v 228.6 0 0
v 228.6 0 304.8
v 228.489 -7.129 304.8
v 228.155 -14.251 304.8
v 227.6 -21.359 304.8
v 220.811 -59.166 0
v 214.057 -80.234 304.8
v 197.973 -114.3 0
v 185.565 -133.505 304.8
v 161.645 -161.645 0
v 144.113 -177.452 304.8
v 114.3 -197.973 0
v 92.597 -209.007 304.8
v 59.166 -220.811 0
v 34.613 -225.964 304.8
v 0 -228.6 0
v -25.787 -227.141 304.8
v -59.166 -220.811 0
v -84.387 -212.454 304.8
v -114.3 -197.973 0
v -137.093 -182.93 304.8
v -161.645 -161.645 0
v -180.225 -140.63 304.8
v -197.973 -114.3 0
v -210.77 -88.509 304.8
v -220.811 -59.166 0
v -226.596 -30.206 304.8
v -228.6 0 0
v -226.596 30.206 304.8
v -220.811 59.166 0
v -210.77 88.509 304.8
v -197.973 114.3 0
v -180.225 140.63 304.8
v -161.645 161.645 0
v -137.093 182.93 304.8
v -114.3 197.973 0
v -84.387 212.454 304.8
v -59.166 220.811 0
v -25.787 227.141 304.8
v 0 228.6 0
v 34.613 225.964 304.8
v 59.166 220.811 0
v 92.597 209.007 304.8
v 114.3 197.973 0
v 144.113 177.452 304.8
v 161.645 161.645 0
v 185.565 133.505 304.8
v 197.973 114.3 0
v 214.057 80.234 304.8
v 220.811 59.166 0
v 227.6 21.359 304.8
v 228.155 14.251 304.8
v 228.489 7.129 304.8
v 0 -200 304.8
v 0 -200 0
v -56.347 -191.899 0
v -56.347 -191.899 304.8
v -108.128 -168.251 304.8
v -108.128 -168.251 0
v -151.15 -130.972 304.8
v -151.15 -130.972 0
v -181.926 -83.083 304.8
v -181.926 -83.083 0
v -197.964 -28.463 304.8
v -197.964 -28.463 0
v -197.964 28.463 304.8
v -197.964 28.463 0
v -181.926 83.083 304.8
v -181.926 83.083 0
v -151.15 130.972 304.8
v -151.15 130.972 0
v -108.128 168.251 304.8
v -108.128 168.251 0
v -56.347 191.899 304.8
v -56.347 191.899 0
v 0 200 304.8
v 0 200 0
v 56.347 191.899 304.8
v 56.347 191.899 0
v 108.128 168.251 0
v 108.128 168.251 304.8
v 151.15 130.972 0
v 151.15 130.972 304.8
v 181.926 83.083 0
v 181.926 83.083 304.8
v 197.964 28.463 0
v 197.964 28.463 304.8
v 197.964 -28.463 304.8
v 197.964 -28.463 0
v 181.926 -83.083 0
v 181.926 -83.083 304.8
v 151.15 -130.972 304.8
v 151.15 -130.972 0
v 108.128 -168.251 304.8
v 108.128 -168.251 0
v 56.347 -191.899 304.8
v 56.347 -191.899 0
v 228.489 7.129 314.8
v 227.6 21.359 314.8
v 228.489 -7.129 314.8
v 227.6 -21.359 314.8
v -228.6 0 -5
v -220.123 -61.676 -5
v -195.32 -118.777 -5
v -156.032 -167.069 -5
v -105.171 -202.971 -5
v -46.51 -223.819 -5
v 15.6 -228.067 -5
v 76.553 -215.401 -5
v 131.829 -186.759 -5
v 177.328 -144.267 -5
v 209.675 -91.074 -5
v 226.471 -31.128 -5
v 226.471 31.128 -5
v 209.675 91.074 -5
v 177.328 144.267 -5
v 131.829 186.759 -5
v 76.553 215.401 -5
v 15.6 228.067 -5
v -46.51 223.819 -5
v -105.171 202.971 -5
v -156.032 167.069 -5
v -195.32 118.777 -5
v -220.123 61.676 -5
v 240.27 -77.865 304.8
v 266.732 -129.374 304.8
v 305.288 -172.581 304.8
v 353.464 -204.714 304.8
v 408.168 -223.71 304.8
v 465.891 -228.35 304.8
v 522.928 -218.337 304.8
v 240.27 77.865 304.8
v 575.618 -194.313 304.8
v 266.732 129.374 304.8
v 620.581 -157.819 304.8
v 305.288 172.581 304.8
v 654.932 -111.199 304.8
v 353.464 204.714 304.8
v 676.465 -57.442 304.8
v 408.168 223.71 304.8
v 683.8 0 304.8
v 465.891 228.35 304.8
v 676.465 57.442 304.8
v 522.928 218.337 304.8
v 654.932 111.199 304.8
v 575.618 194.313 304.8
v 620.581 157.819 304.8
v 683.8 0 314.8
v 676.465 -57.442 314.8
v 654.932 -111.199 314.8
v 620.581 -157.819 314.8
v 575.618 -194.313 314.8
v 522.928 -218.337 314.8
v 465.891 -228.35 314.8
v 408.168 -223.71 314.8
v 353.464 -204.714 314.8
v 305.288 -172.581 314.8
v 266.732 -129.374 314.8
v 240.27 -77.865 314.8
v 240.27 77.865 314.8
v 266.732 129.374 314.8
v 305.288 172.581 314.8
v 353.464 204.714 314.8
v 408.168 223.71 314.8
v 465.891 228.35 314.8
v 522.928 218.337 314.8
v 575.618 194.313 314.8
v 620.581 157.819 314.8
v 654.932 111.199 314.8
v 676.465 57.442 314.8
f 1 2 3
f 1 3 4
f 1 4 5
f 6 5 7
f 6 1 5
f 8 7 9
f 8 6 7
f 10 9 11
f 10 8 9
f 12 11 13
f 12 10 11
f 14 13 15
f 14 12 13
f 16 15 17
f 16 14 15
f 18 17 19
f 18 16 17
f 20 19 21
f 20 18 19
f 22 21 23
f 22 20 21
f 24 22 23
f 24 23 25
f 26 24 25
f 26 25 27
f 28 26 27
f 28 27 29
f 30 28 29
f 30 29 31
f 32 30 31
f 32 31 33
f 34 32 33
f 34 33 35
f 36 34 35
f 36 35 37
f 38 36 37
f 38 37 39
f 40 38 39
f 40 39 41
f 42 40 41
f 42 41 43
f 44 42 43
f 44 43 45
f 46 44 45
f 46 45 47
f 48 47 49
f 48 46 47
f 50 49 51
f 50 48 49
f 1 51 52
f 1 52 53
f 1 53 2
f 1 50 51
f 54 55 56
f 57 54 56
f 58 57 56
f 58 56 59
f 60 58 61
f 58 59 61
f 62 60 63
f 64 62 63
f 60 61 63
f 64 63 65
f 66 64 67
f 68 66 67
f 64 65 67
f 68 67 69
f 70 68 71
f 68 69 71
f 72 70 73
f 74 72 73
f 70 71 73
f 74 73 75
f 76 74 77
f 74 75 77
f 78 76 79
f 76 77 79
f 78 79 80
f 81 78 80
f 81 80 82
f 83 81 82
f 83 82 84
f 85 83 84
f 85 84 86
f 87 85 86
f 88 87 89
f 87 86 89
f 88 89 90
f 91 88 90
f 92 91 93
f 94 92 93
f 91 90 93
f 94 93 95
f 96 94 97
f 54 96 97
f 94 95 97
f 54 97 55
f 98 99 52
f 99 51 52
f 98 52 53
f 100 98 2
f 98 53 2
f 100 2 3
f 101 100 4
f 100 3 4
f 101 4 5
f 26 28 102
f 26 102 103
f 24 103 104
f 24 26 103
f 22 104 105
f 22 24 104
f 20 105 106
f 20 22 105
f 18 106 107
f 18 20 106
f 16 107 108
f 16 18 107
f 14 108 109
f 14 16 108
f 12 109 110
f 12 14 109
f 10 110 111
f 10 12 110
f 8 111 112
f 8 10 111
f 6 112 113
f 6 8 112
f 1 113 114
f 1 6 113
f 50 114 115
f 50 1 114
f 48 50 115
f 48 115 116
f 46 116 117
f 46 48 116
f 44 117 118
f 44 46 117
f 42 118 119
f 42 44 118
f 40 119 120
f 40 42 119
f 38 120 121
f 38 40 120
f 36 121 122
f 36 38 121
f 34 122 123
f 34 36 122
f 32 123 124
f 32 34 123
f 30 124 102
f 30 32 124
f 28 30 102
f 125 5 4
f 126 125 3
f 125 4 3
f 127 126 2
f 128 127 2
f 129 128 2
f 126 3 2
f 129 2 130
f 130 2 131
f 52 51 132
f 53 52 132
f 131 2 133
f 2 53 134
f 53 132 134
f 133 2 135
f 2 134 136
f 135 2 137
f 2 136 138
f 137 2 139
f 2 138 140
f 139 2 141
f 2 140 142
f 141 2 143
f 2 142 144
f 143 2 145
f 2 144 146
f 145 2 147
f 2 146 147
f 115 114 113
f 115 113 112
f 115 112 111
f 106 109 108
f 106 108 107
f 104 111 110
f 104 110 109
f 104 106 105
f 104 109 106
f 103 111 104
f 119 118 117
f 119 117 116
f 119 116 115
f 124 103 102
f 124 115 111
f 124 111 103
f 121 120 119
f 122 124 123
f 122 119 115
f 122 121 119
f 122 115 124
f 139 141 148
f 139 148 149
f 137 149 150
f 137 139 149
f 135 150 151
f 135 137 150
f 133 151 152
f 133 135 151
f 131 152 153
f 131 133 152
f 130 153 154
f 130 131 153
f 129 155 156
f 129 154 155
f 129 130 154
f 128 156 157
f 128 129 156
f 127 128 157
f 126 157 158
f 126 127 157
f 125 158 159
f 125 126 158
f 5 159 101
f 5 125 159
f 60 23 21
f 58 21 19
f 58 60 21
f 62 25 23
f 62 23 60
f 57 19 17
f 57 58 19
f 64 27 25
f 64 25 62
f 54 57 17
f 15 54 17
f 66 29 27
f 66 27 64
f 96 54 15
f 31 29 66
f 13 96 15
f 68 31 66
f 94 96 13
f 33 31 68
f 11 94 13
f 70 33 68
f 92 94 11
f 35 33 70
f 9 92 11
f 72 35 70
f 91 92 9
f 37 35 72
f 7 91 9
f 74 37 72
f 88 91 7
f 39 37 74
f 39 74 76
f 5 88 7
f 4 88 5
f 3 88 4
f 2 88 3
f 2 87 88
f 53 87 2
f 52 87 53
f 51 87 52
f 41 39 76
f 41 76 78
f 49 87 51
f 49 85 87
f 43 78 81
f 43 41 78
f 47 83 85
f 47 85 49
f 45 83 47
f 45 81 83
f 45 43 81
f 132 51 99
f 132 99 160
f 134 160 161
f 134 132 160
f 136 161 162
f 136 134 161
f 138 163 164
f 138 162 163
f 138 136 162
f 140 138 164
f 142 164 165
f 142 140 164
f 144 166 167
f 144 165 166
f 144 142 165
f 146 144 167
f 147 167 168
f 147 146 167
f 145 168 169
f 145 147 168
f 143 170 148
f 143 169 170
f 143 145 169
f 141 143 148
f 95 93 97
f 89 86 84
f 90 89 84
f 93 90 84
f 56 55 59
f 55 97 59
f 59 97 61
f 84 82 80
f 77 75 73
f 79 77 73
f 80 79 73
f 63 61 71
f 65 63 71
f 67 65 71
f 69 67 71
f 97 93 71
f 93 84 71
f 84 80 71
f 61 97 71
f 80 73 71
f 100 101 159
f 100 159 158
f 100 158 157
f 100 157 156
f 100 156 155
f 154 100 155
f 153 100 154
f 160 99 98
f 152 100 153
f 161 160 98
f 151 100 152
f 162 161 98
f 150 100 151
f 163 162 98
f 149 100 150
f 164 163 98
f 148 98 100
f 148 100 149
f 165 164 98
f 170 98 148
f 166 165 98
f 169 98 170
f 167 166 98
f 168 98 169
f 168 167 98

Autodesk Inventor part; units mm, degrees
ref_plane "YZ Plane" through (0, 0, 0) normal (1, 0, 0) x (0, 1, 0)
ref_plane "XZ Plane" through (0, 0, 0) normal (0, 1, 0) x (-1, 0, 0)
ref_plane "XY Plane" through (0, 0, 0) normal (0, 0, 1) x (1, 0, 0)
sketch "Sketch1" plane through (0, 0, 0) normal (0, 0, 1) x (1, 0, 0)
  circle A0 centre (0, 0) radius 228.6
  dimension "d0" = 457.2
extrude "Extrusion1" add sketch "Sketch1" along normal blind 304.8
sketch "Sketch2" plane through (0, 0, 304.8) normal (0, 0, 1) x (1, 0, 0)
  point P0 (0, 0)
hole "Hole1" at (0, 0, 304.8) direction (0, 0, 1) diameter 457.2 end through all
sketch "Sketch3" plane through (0, 0, 0) normal (0, 0, -1) x (-1, 0, 0)
  circle A0 centre (0, 0) radius 228.6
  dimension "d10" = 457.2
hole "Hole2" at (0, 0, 0) direction (0, 0, -1) diameter 457.2 end through all
sketch "Sketch4" plane through (0, 0, 304.8) normal (0, 0, 1) x (1, 0, 0)
  circle A0 centre (0, 0) radius 200
  dimension "d18" = 400
hole "Hole3" at (0, 0, 304.8) direction (0, 0, -1) diameter 400 end through all
sketch "Sketch5" plane through (0, 0, 0) normal (0, 0, -1) x (-1, 0, 0)
  circle A0 centre (0, 0) radius 228.6
  dimension "d26" = 457.2
extrude "Extrusion2" add sketch "Sketch5" along normal blind 5
sketch "Sketch6" plane through (0, 0, 304.8) normal (0, 0, 1) x (1, 0, 0)
  circle A0 centre (0, 0) radius 228.6 projected
  line L0 (228.6, 0) -> (455.2, 0)
  circle A1 centre (455.2, 0) radius 228.6
  point P0 (227.6, -21.3588)
  point P1 (227.6, 21.3588)
  dimension "d29" = 226.6
  dimension "d30" = 457.2
extrude "Extrusion3" add sketch "Sketch6" along normal blind 10 contours A0 A1 picked at (531.7419, 7.0282)
properties part number "box"
